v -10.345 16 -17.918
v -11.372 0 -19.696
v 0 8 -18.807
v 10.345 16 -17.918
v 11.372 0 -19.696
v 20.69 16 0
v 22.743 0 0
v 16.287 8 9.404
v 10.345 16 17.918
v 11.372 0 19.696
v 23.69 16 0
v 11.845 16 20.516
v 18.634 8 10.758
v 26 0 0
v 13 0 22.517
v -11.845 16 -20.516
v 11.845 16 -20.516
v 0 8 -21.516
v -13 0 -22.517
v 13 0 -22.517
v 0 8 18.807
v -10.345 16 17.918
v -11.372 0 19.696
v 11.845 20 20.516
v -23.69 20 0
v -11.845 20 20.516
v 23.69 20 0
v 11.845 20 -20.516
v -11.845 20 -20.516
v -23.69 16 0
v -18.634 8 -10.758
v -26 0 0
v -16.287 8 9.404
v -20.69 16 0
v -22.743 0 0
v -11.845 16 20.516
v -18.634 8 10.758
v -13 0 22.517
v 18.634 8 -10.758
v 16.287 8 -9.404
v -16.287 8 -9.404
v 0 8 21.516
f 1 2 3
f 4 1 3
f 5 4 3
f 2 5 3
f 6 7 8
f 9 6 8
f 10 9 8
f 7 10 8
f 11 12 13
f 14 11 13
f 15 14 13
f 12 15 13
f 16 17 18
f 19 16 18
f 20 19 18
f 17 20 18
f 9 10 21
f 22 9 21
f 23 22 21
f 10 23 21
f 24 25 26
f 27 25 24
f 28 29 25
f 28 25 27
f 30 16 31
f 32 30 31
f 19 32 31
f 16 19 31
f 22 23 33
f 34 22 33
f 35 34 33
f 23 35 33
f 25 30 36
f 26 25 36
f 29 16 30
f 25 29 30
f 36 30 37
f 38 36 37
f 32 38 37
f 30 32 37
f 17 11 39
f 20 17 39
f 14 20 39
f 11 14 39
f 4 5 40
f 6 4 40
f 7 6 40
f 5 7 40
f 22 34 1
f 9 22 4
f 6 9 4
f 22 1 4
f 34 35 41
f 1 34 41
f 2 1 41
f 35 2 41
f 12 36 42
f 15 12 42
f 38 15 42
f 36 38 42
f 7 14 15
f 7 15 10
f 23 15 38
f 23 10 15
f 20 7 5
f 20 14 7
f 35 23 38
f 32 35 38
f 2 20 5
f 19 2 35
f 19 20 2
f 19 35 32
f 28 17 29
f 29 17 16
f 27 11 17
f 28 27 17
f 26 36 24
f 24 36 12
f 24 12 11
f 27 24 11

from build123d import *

# Parameters (mm, degrees)
BOSS_EXTRUDE1_DEPTH = 4


with BuildPart() as part:
    # Sketch2 → Loft1 section 0
    with BuildSketch(Plane(origin=(0, 16, 0), x_dir=(1, 0, 0), z_dir=(0, 1, 0))):
        with BuildLine():
            Line((23.69, 0), (11.845, 20.516141816))
            Line((11.845, 20.516141816), (-11.845, 20.516141816))
            Line((-11.845, 20.516141816), (-23.69, 0))
            Line((-23.69, 0), (-11.845, -20.516141816))
            Line((-11.845, -20.516141816), (11.845, -20.516141816))
            Line((11.845, -20.516141816), (23.69, 0))
        make_face()
    # Sketch1 → Loft1 section 1
    with BuildSketch(Plane(origin=(0, 0, 0), x_dir=(1, 0, 0), z_dir=(0, 1, 0))):
        with BuildLine():
            Line((26, 0), (13, 22.516660498))
            Line((13, 22.516660498), (-13, 22.516660498))
            Line((-13, 22.516660498), (-26, 0))
            Line((-26, 0), (-13, -22.516660498))
            Line((-13, -22.516660498), (13, -22.516660498))
            Line((13, -22.516660498), (26, 0))
        make_face()
    loft()

    # Sketch3 → Boss-Extrude1 (add)
    with BuildSketch(Plane(origin=(0, 16, 0), x_dir=(1, 0, 0), z_dir=(0, 1, 0))):
        Polygon((23.69, 0), (11.845, 20.516141816), (-11.845, 20.516141816), (-23.69, 0), (-11.845, -20.516141816), (11.845, -20.516141816), align=None)
    extrude(amount=BOSS_EXTRUDE1_DEPTH)

    # Sketch5 → Cut-Loft1 section 0
    with BuildSketch(Plane(origin=(0, 16, 0), x_dir=(-1, 0, 0), z_dir=(0, -1, 0))):
        with BuildLine():
            Line((20.69, 0), (10.345, 17.918065604))
            Line((10.345, 17.918065604), (-10.345, 17.918065604))
            Line((-10.345, 17.918065604), (-20.69, 0))
            Line((-20.69, 0), (-10.345, -17.918065604))
            Line((-10.345, -17.918065604), (10.345, -17.918065604))
            Line((10.345, -17.918065604), (20.69, 0))
        make_face()
    # Sketch4 → Cut-Loft1 section 1
    with BuildSketch(Plane(origin=(0, -2, 0), x_dir=(-1, 0, 0), z_dir=(0, -1, 0))):
        with BuildLine():
            Line((23, 0), (11.5, 19.918584287))
            Line((11.5, 19.918584287), (-11.5, 19.918584287))
            Line((-11.5, 19.918584287), (-23, 0))
            Line((-23, 0), (-11.5, -19.918584287))
            Line((-11.5, -19.918584287), (11.5, -19.918584287))
            Line((11.5, -19.918584287), (23, 0))
        make_face()
    loft(mode=Mode.SUBTRACT)


solid = part.part
